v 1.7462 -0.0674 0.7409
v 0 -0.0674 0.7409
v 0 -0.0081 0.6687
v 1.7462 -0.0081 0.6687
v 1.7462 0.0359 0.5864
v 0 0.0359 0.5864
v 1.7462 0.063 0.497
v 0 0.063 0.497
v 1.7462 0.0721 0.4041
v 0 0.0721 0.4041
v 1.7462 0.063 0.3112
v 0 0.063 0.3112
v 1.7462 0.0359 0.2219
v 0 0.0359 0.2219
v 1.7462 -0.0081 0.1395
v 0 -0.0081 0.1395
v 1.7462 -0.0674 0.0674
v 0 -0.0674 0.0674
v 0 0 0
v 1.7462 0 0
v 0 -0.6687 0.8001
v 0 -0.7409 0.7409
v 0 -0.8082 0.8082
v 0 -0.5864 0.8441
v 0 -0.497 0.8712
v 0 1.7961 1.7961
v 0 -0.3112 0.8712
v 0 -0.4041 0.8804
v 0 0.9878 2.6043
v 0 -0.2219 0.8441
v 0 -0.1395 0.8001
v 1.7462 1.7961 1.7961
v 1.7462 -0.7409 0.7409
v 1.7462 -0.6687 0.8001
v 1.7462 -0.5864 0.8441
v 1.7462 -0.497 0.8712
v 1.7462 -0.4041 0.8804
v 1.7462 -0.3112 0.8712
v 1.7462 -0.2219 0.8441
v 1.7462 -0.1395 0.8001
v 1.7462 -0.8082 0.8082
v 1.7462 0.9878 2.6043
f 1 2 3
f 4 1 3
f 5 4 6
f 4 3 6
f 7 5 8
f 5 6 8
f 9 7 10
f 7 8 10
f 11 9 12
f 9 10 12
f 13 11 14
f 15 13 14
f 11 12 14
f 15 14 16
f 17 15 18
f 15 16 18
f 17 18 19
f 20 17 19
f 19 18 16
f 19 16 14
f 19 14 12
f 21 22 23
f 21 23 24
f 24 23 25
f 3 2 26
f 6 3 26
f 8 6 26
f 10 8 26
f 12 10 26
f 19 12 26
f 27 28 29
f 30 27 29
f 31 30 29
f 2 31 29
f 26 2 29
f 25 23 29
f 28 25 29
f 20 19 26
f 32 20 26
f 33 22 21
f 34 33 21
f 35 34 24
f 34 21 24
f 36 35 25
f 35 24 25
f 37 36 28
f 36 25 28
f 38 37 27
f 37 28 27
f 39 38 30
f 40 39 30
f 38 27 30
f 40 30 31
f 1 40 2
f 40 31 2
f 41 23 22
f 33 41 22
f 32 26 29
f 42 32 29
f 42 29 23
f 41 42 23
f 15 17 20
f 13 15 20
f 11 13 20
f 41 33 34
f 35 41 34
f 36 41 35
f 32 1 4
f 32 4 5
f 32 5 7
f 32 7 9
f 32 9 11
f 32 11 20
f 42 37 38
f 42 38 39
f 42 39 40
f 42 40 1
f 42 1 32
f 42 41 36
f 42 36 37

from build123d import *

# Parameters (mm, degrees)
F1_DEPTH = 1.74625
F2_ANGLE = -45


with BuildPart() as f1:
    # F0 (on Right) → F1 (new body)
    with BuildSketch(Plane.YZ):
        with BuildLine():
            Line((0, 0.09525), (0, 0))
            Line((0, 0), (2.54, 0))
            Line((2.54, 0), (2.54, 1.143))
            Line((2.54, 1.143), (0, 1.143))
            Line((0, 1.143), (0, 1.04775))
            ThreePointArc((0, 1.04775), (0.3367596045, 0.9082596045), (0.47625, 0.5715))
            ThreePointArc((0.47625, 0.5715), (0.3367596045, 0.2347403955), (0, 0.09525))
        make_face()
    extrude(amount=F1_DEPTH)


with BuildPart() as f1_1:
    # F2: moved
    add(f1.part.rotate(Axis((0.873125, 0, 0), (-1, 0, 0)), F2_ANGLE))


solid = f1_1.part
